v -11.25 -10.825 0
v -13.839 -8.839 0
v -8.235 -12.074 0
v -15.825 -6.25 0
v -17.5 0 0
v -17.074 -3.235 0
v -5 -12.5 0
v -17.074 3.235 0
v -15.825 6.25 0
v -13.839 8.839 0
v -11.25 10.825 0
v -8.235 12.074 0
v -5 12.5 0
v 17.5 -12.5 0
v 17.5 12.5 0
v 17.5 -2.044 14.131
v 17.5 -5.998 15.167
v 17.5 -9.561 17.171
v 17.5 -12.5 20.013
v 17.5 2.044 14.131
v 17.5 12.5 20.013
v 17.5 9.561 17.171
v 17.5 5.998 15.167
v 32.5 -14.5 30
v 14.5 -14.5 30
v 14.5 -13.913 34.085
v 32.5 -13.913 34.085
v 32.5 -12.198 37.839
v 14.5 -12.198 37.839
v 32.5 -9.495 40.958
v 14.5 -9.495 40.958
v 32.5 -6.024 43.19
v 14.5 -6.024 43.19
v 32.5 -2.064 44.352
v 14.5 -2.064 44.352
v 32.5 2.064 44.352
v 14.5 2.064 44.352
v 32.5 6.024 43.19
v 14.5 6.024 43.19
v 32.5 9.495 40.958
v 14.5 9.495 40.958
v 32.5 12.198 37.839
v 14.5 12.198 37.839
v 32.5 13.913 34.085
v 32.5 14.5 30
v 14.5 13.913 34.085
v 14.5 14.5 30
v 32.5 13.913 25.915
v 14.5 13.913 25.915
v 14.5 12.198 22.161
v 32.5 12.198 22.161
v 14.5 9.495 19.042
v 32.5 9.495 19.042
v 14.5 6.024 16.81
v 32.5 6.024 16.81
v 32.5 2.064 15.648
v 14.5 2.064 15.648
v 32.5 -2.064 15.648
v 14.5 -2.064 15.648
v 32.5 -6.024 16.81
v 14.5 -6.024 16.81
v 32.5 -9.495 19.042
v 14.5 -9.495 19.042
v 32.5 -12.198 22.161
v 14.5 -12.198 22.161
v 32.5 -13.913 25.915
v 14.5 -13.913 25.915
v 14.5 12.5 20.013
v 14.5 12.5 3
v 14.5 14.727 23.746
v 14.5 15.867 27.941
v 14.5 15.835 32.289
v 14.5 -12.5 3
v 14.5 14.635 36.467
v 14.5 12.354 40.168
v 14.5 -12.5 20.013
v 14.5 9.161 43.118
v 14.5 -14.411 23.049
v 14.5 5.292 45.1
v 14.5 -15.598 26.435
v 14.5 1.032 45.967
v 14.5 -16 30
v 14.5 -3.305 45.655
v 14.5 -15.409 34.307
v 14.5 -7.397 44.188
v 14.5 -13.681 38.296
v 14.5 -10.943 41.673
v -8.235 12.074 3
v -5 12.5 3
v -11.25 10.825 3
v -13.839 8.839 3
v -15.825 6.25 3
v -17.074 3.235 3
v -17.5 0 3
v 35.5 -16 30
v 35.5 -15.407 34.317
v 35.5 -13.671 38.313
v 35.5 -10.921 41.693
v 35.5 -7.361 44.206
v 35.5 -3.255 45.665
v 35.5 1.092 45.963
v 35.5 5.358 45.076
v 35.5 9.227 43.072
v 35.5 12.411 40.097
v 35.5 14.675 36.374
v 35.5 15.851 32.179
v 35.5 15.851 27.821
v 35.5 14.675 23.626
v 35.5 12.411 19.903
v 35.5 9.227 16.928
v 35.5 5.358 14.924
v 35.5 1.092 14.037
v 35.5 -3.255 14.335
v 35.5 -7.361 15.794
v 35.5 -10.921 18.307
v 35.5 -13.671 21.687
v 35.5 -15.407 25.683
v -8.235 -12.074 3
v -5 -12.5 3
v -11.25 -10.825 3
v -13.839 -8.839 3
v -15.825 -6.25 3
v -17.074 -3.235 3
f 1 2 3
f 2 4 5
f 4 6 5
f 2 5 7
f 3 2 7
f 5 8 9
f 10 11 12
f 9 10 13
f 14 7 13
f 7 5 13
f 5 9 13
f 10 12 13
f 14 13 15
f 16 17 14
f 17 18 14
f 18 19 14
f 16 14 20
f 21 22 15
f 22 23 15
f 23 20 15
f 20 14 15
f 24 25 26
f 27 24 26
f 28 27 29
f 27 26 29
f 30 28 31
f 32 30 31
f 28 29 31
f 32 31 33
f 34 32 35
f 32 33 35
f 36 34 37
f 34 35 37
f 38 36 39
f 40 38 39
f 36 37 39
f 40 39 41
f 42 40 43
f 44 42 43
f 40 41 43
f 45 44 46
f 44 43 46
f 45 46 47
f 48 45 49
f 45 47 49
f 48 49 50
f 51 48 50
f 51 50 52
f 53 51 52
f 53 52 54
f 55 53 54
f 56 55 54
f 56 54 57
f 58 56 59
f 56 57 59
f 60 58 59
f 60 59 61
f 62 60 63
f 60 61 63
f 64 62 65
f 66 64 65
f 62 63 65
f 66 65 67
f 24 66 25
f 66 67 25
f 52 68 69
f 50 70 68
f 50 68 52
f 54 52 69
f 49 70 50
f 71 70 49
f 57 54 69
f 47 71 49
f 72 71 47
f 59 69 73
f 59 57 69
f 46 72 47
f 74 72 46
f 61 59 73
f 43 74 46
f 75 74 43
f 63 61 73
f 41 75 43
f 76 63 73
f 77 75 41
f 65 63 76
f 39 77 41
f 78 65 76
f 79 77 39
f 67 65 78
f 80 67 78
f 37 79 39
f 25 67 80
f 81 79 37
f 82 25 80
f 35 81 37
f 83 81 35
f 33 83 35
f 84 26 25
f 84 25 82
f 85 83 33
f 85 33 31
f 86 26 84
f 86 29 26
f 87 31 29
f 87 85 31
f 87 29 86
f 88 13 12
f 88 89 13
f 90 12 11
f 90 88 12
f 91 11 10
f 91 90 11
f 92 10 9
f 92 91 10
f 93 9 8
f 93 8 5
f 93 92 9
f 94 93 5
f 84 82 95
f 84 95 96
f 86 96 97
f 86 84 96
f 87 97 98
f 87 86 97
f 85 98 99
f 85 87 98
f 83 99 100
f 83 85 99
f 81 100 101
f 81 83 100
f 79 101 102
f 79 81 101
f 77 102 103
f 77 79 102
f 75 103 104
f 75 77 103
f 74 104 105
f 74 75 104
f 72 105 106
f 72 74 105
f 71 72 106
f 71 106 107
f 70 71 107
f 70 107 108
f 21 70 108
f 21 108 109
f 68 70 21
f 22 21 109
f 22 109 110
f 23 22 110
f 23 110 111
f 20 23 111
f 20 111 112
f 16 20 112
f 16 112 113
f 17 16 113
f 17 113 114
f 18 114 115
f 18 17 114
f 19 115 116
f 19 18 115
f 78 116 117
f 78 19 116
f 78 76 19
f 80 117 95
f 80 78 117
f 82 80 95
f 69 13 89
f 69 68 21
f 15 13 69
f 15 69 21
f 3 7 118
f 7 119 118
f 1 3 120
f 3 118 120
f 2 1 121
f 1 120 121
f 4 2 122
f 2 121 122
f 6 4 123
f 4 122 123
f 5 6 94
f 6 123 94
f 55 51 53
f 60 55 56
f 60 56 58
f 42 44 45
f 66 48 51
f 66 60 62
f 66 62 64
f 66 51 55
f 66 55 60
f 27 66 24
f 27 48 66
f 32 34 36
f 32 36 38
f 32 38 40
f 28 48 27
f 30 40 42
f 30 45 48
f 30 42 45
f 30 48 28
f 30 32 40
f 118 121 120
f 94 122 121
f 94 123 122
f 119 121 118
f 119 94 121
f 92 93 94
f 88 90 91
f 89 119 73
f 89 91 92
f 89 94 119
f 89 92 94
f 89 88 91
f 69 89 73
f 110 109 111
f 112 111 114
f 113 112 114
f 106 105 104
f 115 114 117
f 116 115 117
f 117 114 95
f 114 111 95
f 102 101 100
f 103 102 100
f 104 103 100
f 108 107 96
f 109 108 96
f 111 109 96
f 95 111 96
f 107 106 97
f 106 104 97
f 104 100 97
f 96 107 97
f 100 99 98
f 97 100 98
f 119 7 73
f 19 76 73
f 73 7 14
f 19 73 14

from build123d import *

# Parameters (mm, degrees)
F0_W     = 35
F0_H     = 25
F1_DEPTH = 3
F2_W     = 3
F2_H     = 25
F3_DEPTH = 40
F4_R     = 12.49999
F5_R     = 12.49999
F6_R     = 16
F7_DEPTH = 21
F8_R     = 14.5
F9_DEPTH = 18


# Not quite as in the source:
# - a fillet or chamfer is up to 0.001 mm smaller than in the source, because OpenCascade refuses the exact size


with BuildPart() as f1:
    # F0 (on Top) → F1 (new body)
    with BuildSketch(Plane.XY):
        Rectangle(F0_W, F0_H)
    extrude(amount=F1_DEPTH)

    # F2 (on Top) → F3 (join)
    with BuildSketch(Plane.XY):
        with Locations((16, 0)):
            Rectangle(F2_W, F2_H)
    extrude(amount=F3_DEPTH)

    # F4 (radius 12.5 in the source; OpenCascade refuses exactly that, so slightly less here)
    f4_edges = [f1.edges().sort_by_distance(p)[0] for p in [
        (-17.5, 12.5, 1.5),
        (-17.5, -12.5, 1.5),
    ]]
    fillet(f4_edges, radius=F4_R)

    # F5 (radius 12.5 in the source; OpenCascade refuses exactly that, so slightly less here)
    f5_edges = [f1.edges().sort_by_distance(p)[0] for p in [
        (16, 12.5, 40),
        (16, -12.5, 40),
    ]]
    fillet(f5_edges, radius=F5_R)

    # F6 (on face) → F7 (join)
    with BuildSketch(Plane(origin=(14.5, 0, 0), x_dir=(0, -1, 0), z_dir=(-1, 0, 0))):
        with Locations((0, 30)):
            Circle(F6_R)
    extrude(amount=-F7_DEPTH)

    # F8 (on face) → F9 (cut)
    with BuildSketch(Plane(origin=(14.5, 0, 0), x_dir=(0, -1, 0), z_dir=(-1, 0, 0))):
        with Locations((0, 30)):
            Circle(F8_R)
    extrude(amount=-F9_DEPTH, mode=Mode.SUBTRACT)


solid = f1.part
